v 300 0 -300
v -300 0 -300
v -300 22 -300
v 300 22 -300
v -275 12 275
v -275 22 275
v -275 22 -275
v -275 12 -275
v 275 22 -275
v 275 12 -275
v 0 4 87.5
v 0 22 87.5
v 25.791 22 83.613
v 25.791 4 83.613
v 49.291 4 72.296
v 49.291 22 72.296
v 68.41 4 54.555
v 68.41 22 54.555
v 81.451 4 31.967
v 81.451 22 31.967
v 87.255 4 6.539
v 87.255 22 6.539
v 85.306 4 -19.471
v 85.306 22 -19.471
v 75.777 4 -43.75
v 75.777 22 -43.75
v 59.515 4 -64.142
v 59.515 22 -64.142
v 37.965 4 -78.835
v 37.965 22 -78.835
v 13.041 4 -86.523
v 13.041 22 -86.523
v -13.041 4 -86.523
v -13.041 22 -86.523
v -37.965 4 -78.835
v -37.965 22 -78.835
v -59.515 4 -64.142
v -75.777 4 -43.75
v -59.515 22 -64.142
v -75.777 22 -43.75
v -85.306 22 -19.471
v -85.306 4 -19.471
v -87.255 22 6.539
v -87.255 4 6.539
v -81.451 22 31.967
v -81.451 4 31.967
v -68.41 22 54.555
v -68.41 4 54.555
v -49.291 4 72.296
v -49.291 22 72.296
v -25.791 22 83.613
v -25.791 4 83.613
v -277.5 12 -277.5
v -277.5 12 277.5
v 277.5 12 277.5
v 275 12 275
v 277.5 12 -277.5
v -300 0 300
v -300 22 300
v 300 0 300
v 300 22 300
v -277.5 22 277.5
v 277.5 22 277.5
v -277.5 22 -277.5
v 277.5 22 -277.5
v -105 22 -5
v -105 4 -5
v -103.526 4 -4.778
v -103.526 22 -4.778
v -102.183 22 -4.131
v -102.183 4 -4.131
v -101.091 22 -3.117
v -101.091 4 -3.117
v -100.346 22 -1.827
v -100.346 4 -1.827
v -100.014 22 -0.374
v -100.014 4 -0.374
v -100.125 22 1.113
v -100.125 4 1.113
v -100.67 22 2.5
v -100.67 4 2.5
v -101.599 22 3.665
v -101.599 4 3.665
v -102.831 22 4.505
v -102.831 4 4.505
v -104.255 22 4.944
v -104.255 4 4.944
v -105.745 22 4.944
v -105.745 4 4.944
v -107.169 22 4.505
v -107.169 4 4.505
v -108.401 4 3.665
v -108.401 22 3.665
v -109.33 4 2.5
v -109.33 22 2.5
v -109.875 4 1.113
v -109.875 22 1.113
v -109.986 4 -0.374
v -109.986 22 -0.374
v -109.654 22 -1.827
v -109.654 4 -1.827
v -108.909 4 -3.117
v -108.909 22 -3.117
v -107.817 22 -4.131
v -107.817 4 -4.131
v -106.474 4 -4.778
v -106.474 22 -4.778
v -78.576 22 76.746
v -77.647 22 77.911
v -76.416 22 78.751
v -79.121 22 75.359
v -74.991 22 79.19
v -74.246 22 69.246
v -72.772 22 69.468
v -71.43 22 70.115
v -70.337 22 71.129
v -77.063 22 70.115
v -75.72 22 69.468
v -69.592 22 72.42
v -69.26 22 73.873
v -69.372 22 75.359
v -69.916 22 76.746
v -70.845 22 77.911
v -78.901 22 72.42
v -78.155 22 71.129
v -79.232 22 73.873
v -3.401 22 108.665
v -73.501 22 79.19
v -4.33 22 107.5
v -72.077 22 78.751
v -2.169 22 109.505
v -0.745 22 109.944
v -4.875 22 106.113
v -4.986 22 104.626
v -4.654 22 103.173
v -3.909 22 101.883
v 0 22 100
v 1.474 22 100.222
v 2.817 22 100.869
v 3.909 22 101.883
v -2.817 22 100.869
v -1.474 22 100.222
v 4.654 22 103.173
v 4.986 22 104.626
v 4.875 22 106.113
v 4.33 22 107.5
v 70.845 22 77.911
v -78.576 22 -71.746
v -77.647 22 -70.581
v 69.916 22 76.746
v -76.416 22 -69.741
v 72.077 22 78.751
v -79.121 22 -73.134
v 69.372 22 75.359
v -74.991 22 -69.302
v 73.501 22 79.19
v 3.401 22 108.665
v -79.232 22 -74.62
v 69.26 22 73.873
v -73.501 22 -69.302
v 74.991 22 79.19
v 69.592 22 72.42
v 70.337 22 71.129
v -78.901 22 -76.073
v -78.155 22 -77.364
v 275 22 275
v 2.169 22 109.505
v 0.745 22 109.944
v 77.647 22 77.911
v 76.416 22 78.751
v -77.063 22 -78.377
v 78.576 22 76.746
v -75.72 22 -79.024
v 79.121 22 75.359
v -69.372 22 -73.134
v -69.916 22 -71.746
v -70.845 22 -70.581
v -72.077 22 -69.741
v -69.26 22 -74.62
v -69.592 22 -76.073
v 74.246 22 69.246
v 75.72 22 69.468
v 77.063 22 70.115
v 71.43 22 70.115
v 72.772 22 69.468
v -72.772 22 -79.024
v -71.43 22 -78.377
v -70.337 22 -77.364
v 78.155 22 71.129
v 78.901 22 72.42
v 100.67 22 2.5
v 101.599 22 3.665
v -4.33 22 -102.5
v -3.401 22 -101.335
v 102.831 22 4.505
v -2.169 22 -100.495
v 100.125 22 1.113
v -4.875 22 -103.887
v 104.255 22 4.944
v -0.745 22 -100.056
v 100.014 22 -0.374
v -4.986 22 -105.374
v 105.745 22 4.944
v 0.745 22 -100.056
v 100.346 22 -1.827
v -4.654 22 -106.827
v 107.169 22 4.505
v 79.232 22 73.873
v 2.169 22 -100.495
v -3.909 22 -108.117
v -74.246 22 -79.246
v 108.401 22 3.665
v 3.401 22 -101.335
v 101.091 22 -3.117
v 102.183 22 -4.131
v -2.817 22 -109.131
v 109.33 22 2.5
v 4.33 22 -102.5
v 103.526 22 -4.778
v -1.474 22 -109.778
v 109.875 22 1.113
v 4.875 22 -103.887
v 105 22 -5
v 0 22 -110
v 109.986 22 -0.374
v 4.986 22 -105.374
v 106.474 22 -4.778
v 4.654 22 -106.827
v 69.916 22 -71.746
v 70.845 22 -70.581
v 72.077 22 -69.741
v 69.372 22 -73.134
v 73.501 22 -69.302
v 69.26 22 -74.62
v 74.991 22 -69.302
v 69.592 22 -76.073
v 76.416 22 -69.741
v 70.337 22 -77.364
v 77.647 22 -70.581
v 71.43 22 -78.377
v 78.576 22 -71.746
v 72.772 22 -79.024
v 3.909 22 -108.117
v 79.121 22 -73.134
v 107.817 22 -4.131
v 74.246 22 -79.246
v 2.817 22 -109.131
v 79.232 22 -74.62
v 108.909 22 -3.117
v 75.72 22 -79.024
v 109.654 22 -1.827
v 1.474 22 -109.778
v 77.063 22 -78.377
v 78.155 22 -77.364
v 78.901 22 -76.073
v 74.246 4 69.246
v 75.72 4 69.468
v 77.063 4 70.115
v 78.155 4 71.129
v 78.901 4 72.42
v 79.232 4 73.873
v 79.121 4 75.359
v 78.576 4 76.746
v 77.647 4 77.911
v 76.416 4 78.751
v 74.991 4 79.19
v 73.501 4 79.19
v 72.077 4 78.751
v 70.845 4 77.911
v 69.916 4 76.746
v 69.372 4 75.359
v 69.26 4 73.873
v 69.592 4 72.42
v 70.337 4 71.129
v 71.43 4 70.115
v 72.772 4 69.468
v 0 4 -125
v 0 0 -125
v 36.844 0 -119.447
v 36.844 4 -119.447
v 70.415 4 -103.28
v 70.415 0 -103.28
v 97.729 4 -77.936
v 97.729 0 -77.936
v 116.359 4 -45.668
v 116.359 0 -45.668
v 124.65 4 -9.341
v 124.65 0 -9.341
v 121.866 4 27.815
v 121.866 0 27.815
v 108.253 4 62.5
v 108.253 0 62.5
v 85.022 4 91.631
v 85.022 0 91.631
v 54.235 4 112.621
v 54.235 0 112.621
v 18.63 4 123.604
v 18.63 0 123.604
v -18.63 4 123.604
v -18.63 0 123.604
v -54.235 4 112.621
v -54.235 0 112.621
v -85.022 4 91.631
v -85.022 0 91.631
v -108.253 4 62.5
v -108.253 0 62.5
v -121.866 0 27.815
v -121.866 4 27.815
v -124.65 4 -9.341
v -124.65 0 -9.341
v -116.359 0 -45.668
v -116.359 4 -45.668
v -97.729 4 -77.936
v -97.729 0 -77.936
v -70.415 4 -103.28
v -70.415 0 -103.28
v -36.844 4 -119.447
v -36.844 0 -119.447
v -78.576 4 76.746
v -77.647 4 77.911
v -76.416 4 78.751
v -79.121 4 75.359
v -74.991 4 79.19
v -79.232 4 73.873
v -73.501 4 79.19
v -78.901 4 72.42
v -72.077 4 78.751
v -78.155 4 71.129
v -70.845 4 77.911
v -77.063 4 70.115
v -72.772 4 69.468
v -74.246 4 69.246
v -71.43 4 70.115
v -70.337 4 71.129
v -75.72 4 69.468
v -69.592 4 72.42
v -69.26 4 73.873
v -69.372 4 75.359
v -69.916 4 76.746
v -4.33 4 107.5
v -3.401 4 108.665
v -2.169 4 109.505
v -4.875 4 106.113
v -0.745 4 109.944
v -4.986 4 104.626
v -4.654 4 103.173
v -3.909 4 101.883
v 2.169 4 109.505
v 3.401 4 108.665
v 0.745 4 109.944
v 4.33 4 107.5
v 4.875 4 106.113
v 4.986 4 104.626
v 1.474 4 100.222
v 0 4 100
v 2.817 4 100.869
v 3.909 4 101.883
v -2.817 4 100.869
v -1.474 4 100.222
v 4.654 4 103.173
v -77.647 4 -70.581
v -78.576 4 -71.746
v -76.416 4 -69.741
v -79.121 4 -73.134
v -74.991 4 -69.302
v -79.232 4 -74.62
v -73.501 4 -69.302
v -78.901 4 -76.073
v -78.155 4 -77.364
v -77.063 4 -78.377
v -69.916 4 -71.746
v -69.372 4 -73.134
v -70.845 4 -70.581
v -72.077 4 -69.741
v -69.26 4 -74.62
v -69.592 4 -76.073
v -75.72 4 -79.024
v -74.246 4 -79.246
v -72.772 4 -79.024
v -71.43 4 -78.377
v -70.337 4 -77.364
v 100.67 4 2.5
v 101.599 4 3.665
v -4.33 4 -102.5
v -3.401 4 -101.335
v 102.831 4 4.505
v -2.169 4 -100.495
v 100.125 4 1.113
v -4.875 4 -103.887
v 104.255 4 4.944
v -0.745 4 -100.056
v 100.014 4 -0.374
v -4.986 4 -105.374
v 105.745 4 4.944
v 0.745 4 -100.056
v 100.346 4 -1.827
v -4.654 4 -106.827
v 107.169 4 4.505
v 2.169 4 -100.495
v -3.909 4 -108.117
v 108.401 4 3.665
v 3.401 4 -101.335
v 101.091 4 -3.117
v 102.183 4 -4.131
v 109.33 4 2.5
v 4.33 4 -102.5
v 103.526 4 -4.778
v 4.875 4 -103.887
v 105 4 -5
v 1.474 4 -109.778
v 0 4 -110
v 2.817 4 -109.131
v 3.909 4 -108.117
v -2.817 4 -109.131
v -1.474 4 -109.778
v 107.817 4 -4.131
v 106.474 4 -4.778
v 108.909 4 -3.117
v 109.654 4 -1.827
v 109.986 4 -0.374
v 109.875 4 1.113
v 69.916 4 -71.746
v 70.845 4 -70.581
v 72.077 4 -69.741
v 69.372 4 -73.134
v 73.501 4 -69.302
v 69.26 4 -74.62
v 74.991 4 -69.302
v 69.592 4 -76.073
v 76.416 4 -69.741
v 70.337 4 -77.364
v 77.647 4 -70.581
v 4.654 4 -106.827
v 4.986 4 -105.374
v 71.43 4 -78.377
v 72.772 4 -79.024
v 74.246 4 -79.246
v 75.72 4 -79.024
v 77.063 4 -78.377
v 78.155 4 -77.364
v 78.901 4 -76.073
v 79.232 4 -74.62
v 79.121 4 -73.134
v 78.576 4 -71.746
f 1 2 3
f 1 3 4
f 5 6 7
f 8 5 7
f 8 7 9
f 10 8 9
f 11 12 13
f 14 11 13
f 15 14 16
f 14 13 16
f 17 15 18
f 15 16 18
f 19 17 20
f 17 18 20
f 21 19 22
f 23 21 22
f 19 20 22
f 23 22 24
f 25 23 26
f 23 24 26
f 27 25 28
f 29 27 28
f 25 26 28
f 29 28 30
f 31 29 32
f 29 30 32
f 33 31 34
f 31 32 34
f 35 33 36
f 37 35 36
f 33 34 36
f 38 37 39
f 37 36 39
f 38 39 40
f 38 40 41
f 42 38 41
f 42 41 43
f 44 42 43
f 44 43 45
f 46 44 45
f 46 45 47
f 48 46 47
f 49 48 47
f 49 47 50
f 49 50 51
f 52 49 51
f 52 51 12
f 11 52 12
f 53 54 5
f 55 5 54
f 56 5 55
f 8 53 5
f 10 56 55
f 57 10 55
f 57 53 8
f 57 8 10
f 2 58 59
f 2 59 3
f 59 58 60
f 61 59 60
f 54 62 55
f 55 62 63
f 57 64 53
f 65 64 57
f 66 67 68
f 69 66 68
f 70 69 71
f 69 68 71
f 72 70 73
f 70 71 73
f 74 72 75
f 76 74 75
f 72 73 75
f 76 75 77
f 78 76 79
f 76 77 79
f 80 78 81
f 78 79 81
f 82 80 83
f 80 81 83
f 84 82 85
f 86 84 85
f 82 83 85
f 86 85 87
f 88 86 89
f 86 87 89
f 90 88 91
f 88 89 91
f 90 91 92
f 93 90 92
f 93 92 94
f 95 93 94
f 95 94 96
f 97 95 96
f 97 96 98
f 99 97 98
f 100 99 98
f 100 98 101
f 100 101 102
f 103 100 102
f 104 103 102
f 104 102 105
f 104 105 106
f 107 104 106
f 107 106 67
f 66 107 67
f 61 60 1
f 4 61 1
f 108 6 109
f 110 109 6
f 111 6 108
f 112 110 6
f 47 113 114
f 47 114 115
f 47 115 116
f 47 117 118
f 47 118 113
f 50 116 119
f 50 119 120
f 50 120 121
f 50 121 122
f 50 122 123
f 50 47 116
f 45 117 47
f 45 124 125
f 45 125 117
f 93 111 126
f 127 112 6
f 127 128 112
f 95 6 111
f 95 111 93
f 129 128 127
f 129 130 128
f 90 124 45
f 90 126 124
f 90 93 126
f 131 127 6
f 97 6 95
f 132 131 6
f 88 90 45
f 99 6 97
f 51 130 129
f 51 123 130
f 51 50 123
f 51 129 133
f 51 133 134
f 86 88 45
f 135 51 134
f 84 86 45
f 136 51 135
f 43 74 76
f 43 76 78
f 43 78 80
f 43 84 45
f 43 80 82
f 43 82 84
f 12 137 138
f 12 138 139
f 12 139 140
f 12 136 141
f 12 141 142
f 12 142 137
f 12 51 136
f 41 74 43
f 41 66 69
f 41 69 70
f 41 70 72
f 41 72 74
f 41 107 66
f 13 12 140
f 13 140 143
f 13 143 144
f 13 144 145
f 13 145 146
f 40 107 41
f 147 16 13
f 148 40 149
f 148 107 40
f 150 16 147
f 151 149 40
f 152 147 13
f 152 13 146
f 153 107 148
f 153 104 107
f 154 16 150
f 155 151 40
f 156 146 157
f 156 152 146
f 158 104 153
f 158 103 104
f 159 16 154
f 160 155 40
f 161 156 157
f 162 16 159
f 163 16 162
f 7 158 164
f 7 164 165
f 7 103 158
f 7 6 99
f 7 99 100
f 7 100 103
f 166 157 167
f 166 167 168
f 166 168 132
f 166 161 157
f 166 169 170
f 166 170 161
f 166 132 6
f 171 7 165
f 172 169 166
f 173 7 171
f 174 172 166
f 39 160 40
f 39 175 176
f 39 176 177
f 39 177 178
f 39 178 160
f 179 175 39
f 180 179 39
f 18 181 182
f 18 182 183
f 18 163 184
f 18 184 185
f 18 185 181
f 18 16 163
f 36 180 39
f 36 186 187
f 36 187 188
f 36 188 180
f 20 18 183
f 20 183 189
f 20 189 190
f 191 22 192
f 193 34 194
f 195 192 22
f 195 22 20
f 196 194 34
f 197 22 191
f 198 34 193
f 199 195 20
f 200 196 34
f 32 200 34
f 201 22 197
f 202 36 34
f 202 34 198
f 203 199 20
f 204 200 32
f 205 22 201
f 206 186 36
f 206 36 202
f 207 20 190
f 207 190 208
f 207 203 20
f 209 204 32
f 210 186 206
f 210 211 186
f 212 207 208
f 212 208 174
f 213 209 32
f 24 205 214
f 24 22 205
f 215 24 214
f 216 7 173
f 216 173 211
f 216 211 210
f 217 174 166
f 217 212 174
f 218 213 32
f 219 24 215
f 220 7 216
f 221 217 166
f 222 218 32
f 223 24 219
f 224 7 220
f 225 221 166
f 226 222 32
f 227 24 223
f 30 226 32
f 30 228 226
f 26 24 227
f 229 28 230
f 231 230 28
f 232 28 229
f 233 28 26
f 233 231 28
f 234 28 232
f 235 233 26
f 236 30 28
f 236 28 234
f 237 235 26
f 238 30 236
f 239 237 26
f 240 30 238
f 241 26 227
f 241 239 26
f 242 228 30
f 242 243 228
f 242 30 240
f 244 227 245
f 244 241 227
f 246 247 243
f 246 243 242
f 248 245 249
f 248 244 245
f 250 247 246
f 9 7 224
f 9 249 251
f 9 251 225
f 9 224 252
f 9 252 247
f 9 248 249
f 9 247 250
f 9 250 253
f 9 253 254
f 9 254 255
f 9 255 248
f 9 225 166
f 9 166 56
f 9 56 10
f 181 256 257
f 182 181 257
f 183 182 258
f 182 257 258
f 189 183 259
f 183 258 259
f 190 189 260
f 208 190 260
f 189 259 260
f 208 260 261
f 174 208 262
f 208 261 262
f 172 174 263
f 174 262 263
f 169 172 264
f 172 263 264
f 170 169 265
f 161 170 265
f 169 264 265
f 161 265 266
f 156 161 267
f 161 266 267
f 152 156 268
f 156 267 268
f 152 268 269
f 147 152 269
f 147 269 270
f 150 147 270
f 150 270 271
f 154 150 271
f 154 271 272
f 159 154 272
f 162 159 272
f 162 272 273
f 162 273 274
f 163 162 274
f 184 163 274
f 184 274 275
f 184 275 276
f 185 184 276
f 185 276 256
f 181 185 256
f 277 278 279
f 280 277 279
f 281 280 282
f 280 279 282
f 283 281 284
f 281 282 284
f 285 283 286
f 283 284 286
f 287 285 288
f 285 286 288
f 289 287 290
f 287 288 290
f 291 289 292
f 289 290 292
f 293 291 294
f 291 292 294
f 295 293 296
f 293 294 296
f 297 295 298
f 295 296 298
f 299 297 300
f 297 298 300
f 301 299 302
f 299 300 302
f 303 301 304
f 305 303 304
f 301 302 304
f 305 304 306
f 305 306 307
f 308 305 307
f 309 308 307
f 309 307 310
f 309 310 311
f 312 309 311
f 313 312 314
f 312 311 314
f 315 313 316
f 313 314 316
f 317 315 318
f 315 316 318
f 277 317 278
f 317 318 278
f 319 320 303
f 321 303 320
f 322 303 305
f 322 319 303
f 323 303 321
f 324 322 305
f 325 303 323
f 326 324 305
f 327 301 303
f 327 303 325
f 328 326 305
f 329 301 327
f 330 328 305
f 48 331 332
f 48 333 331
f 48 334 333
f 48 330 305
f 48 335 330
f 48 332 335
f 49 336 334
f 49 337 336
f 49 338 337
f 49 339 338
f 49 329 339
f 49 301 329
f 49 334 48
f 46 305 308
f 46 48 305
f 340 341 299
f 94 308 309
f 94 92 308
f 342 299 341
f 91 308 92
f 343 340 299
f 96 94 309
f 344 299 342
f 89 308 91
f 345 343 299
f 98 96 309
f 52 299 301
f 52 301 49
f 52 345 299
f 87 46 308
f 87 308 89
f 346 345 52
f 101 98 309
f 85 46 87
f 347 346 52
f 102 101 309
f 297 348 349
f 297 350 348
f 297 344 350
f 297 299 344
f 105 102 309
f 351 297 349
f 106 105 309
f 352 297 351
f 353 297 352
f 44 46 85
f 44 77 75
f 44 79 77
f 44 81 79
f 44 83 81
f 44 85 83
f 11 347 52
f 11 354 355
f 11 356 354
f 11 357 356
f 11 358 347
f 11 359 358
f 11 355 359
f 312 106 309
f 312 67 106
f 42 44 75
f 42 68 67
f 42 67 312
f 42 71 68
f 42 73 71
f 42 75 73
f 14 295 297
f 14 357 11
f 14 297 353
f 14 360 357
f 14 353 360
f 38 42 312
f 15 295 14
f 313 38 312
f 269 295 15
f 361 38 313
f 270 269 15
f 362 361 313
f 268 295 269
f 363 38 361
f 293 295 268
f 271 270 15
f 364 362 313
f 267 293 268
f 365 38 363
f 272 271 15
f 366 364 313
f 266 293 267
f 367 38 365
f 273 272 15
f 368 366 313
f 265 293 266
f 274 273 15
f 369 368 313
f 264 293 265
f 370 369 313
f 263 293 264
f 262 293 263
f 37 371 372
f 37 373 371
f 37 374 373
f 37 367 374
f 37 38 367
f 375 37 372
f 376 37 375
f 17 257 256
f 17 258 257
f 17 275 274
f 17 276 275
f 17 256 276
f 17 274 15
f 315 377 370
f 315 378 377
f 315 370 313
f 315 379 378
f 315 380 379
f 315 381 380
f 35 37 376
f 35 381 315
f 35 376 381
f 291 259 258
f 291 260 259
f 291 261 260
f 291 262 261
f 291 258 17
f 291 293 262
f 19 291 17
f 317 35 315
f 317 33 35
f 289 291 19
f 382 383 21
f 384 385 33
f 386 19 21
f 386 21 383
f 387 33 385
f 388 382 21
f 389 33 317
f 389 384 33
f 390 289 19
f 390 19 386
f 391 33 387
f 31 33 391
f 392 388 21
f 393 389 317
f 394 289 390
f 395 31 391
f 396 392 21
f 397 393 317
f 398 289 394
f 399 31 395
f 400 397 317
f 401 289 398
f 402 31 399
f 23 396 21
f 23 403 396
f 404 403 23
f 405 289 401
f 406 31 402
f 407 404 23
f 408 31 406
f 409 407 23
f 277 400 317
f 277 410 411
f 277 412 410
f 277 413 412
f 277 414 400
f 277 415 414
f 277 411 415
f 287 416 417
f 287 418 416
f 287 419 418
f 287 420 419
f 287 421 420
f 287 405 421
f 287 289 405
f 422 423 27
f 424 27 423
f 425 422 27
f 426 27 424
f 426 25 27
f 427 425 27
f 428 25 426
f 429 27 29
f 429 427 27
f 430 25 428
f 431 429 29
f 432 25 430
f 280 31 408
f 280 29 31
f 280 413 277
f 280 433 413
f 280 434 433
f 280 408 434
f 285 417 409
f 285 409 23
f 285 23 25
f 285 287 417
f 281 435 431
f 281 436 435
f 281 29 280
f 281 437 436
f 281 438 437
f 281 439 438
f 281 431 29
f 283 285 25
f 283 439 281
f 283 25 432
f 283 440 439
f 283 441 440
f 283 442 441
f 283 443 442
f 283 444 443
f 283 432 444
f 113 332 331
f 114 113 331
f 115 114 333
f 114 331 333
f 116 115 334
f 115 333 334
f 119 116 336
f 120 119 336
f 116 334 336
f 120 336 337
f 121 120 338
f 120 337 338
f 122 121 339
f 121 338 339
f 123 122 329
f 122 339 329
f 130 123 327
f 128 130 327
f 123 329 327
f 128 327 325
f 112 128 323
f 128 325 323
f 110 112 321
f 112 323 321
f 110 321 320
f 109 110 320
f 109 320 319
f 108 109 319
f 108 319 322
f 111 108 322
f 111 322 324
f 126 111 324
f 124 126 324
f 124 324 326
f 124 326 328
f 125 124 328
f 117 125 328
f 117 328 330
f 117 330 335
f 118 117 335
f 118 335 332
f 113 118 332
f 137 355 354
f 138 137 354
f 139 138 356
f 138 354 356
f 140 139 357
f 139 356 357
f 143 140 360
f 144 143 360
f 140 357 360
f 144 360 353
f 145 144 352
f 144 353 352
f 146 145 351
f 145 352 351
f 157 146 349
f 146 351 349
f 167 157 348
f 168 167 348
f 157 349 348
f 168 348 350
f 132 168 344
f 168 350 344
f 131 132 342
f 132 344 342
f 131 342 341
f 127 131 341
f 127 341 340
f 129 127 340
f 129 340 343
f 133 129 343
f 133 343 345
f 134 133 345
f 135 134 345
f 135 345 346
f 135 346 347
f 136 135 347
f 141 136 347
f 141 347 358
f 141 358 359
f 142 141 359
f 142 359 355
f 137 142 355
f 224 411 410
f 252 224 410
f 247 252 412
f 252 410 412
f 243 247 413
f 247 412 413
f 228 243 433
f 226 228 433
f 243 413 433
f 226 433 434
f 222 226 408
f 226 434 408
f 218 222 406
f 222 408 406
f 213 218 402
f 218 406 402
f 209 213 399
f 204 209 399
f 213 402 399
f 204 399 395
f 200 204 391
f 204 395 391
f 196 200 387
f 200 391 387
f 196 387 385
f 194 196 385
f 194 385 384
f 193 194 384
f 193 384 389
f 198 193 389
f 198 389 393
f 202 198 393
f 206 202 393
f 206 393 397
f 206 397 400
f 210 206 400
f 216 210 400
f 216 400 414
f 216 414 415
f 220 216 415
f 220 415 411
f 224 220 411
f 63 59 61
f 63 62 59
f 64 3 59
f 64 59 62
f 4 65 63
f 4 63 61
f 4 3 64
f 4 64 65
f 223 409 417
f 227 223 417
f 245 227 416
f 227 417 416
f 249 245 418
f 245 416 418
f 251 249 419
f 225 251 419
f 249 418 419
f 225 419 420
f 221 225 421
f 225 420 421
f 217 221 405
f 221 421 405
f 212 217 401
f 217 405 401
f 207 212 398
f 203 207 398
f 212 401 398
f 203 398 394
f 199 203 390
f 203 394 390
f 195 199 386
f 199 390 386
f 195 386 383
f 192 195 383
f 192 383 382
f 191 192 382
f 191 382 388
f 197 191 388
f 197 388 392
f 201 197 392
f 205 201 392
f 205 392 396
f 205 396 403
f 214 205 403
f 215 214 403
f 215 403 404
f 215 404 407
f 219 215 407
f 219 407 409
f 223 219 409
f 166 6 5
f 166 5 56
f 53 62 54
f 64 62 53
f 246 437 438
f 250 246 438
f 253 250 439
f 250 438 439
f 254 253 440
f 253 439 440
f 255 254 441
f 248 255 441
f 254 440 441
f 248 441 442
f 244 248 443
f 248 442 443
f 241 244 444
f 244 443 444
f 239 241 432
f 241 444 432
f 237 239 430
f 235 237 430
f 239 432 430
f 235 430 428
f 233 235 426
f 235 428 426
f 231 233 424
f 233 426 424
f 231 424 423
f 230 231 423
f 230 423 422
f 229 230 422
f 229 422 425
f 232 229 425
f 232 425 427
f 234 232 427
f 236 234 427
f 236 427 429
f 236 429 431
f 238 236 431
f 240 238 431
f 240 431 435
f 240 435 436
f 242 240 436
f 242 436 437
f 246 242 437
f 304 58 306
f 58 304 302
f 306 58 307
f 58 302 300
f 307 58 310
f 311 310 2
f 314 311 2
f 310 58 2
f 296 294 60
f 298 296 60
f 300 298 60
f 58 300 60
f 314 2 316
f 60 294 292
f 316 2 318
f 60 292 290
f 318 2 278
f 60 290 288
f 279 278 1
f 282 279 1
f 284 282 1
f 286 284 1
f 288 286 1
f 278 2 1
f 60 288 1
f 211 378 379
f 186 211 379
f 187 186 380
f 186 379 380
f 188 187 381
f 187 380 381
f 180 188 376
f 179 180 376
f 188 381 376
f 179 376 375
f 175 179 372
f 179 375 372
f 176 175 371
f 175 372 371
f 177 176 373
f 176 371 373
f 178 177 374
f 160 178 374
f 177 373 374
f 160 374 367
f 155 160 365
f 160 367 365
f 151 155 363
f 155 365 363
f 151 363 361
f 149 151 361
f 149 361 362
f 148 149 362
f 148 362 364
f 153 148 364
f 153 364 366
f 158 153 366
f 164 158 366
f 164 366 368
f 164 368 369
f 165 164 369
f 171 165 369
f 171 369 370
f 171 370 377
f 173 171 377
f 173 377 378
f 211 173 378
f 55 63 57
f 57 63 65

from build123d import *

# Parameters (mm, degrees)
SKETCH1_W          = 600
SKETCH1_H          = 600
PLATE_DEPTH        = 22
SKETCH2_R          = 87.5
BEARING_HOLE_DEPTH = 425.834085262
SKETCH4_W          = 555
SKETCH4_H          = 555
SKETCH4_W_2        = 550
SKETCH4_H_2        = 550
CUT_EXTRUDE3_DEPTH = 10
SKETCH5_R          = 125
CUT_EXTRUDE4_DEPTH = 4
SKETCH6_R          = 5
CUT_EXTRUDE5_DEPTH = 425.645734701


with BuildPart() as part:
    # Sketch1 → plate (new body)
    with BuildSketch(Plane(origin=(0, 0, 0), x_dir=(1, 0, 0), z_dir=(0, 1, 0))):
        Rectangle(SKETCH1_W, SKETCH1_H)
    extrude(amount=PLATE_DEPTH)

    # Sketch2 → bearing-hole (cut, through all)
    with BuildSketch(Plane(origin=(0, 22, 0), x_dir=(1, 0, 0), z_dir=(0, 1, 0))):
        with Locations(Location((0, 0, 0), (0, 0, 270))):
            Circle(SKETCH2_R)
    extrude(amount=-BEARING_HOLE_DEPTH, mode=Mode.SUBTRACT)

    # Sketch4 → Cut-Extrude3 (cut)
    with BuildSketch(Plane(origin=(0, 22, 0), x_dir=(1, 0, 0), z_dir=(0, 1, 0))):
        Rectangle(SKETCH4_W, SKETCH4_H)
        Rectangle(SKETCH4_W_2, SKETCH4_H_2, mode=Mode.SUBTRACT)
    extrude(amount=-CUT_EXTRUDE3_DEPTH, mode=Mode.SUBTRACT)

    # Sketch5 → Cut-Extrude4 (cut)
    with BuildSketch(Plane.XZ):
        with Locations(Location((0, 0, 0), (0, 0, 270))):
            Circle(SKETCH5_R)
    extrude(amount=-CUT_EXTRUDE4_DEPTH, mode=Mode.SUBTRACT)

    # Sketch6 → Cut-Extrude5 (cut, through all)
    with BuildSketch(Plane.XZ.offset(-4)):
        with Locations(Location((0, 105, 0), (0, 0, 270))):
            Circle(SKETCH6_R)
        with Locations(Location((74.246212025, 74.246212025, 0), (0, 0, 270))):
            Circle(SKETCH6_R)
        with Locations(Location((105, 0, 0), (0, 0, 270))):
            Circle(SKETCH6_R)
        with Locations(Location((74.246212025, -74.246212025, 0), (0, 0, 270))):
            Circle(SKETCH6_R)
        with Locations(Location((0, -105, 0), (0, 0, 270))):
            Circle(SKETCH6_R)
        with Locations(Location((-74.246212025, -74.246212025, 0), (0, 0, 270))):
            Circle(SKETCH6_R)
        with Locations(Location((-105, 0, 0), (0, 0, 270))):
            Circle(SKETCH6_R)
        with Locations(Location((-74.246212025, 74.246212025, 0), (0, 0, 270))):
            Circle(SKETCH6_R)
    extrude(amount=-CUT_EXTRUDE5_DEPTH, mode=Mode.SUBTRACT)


solid = part.part
